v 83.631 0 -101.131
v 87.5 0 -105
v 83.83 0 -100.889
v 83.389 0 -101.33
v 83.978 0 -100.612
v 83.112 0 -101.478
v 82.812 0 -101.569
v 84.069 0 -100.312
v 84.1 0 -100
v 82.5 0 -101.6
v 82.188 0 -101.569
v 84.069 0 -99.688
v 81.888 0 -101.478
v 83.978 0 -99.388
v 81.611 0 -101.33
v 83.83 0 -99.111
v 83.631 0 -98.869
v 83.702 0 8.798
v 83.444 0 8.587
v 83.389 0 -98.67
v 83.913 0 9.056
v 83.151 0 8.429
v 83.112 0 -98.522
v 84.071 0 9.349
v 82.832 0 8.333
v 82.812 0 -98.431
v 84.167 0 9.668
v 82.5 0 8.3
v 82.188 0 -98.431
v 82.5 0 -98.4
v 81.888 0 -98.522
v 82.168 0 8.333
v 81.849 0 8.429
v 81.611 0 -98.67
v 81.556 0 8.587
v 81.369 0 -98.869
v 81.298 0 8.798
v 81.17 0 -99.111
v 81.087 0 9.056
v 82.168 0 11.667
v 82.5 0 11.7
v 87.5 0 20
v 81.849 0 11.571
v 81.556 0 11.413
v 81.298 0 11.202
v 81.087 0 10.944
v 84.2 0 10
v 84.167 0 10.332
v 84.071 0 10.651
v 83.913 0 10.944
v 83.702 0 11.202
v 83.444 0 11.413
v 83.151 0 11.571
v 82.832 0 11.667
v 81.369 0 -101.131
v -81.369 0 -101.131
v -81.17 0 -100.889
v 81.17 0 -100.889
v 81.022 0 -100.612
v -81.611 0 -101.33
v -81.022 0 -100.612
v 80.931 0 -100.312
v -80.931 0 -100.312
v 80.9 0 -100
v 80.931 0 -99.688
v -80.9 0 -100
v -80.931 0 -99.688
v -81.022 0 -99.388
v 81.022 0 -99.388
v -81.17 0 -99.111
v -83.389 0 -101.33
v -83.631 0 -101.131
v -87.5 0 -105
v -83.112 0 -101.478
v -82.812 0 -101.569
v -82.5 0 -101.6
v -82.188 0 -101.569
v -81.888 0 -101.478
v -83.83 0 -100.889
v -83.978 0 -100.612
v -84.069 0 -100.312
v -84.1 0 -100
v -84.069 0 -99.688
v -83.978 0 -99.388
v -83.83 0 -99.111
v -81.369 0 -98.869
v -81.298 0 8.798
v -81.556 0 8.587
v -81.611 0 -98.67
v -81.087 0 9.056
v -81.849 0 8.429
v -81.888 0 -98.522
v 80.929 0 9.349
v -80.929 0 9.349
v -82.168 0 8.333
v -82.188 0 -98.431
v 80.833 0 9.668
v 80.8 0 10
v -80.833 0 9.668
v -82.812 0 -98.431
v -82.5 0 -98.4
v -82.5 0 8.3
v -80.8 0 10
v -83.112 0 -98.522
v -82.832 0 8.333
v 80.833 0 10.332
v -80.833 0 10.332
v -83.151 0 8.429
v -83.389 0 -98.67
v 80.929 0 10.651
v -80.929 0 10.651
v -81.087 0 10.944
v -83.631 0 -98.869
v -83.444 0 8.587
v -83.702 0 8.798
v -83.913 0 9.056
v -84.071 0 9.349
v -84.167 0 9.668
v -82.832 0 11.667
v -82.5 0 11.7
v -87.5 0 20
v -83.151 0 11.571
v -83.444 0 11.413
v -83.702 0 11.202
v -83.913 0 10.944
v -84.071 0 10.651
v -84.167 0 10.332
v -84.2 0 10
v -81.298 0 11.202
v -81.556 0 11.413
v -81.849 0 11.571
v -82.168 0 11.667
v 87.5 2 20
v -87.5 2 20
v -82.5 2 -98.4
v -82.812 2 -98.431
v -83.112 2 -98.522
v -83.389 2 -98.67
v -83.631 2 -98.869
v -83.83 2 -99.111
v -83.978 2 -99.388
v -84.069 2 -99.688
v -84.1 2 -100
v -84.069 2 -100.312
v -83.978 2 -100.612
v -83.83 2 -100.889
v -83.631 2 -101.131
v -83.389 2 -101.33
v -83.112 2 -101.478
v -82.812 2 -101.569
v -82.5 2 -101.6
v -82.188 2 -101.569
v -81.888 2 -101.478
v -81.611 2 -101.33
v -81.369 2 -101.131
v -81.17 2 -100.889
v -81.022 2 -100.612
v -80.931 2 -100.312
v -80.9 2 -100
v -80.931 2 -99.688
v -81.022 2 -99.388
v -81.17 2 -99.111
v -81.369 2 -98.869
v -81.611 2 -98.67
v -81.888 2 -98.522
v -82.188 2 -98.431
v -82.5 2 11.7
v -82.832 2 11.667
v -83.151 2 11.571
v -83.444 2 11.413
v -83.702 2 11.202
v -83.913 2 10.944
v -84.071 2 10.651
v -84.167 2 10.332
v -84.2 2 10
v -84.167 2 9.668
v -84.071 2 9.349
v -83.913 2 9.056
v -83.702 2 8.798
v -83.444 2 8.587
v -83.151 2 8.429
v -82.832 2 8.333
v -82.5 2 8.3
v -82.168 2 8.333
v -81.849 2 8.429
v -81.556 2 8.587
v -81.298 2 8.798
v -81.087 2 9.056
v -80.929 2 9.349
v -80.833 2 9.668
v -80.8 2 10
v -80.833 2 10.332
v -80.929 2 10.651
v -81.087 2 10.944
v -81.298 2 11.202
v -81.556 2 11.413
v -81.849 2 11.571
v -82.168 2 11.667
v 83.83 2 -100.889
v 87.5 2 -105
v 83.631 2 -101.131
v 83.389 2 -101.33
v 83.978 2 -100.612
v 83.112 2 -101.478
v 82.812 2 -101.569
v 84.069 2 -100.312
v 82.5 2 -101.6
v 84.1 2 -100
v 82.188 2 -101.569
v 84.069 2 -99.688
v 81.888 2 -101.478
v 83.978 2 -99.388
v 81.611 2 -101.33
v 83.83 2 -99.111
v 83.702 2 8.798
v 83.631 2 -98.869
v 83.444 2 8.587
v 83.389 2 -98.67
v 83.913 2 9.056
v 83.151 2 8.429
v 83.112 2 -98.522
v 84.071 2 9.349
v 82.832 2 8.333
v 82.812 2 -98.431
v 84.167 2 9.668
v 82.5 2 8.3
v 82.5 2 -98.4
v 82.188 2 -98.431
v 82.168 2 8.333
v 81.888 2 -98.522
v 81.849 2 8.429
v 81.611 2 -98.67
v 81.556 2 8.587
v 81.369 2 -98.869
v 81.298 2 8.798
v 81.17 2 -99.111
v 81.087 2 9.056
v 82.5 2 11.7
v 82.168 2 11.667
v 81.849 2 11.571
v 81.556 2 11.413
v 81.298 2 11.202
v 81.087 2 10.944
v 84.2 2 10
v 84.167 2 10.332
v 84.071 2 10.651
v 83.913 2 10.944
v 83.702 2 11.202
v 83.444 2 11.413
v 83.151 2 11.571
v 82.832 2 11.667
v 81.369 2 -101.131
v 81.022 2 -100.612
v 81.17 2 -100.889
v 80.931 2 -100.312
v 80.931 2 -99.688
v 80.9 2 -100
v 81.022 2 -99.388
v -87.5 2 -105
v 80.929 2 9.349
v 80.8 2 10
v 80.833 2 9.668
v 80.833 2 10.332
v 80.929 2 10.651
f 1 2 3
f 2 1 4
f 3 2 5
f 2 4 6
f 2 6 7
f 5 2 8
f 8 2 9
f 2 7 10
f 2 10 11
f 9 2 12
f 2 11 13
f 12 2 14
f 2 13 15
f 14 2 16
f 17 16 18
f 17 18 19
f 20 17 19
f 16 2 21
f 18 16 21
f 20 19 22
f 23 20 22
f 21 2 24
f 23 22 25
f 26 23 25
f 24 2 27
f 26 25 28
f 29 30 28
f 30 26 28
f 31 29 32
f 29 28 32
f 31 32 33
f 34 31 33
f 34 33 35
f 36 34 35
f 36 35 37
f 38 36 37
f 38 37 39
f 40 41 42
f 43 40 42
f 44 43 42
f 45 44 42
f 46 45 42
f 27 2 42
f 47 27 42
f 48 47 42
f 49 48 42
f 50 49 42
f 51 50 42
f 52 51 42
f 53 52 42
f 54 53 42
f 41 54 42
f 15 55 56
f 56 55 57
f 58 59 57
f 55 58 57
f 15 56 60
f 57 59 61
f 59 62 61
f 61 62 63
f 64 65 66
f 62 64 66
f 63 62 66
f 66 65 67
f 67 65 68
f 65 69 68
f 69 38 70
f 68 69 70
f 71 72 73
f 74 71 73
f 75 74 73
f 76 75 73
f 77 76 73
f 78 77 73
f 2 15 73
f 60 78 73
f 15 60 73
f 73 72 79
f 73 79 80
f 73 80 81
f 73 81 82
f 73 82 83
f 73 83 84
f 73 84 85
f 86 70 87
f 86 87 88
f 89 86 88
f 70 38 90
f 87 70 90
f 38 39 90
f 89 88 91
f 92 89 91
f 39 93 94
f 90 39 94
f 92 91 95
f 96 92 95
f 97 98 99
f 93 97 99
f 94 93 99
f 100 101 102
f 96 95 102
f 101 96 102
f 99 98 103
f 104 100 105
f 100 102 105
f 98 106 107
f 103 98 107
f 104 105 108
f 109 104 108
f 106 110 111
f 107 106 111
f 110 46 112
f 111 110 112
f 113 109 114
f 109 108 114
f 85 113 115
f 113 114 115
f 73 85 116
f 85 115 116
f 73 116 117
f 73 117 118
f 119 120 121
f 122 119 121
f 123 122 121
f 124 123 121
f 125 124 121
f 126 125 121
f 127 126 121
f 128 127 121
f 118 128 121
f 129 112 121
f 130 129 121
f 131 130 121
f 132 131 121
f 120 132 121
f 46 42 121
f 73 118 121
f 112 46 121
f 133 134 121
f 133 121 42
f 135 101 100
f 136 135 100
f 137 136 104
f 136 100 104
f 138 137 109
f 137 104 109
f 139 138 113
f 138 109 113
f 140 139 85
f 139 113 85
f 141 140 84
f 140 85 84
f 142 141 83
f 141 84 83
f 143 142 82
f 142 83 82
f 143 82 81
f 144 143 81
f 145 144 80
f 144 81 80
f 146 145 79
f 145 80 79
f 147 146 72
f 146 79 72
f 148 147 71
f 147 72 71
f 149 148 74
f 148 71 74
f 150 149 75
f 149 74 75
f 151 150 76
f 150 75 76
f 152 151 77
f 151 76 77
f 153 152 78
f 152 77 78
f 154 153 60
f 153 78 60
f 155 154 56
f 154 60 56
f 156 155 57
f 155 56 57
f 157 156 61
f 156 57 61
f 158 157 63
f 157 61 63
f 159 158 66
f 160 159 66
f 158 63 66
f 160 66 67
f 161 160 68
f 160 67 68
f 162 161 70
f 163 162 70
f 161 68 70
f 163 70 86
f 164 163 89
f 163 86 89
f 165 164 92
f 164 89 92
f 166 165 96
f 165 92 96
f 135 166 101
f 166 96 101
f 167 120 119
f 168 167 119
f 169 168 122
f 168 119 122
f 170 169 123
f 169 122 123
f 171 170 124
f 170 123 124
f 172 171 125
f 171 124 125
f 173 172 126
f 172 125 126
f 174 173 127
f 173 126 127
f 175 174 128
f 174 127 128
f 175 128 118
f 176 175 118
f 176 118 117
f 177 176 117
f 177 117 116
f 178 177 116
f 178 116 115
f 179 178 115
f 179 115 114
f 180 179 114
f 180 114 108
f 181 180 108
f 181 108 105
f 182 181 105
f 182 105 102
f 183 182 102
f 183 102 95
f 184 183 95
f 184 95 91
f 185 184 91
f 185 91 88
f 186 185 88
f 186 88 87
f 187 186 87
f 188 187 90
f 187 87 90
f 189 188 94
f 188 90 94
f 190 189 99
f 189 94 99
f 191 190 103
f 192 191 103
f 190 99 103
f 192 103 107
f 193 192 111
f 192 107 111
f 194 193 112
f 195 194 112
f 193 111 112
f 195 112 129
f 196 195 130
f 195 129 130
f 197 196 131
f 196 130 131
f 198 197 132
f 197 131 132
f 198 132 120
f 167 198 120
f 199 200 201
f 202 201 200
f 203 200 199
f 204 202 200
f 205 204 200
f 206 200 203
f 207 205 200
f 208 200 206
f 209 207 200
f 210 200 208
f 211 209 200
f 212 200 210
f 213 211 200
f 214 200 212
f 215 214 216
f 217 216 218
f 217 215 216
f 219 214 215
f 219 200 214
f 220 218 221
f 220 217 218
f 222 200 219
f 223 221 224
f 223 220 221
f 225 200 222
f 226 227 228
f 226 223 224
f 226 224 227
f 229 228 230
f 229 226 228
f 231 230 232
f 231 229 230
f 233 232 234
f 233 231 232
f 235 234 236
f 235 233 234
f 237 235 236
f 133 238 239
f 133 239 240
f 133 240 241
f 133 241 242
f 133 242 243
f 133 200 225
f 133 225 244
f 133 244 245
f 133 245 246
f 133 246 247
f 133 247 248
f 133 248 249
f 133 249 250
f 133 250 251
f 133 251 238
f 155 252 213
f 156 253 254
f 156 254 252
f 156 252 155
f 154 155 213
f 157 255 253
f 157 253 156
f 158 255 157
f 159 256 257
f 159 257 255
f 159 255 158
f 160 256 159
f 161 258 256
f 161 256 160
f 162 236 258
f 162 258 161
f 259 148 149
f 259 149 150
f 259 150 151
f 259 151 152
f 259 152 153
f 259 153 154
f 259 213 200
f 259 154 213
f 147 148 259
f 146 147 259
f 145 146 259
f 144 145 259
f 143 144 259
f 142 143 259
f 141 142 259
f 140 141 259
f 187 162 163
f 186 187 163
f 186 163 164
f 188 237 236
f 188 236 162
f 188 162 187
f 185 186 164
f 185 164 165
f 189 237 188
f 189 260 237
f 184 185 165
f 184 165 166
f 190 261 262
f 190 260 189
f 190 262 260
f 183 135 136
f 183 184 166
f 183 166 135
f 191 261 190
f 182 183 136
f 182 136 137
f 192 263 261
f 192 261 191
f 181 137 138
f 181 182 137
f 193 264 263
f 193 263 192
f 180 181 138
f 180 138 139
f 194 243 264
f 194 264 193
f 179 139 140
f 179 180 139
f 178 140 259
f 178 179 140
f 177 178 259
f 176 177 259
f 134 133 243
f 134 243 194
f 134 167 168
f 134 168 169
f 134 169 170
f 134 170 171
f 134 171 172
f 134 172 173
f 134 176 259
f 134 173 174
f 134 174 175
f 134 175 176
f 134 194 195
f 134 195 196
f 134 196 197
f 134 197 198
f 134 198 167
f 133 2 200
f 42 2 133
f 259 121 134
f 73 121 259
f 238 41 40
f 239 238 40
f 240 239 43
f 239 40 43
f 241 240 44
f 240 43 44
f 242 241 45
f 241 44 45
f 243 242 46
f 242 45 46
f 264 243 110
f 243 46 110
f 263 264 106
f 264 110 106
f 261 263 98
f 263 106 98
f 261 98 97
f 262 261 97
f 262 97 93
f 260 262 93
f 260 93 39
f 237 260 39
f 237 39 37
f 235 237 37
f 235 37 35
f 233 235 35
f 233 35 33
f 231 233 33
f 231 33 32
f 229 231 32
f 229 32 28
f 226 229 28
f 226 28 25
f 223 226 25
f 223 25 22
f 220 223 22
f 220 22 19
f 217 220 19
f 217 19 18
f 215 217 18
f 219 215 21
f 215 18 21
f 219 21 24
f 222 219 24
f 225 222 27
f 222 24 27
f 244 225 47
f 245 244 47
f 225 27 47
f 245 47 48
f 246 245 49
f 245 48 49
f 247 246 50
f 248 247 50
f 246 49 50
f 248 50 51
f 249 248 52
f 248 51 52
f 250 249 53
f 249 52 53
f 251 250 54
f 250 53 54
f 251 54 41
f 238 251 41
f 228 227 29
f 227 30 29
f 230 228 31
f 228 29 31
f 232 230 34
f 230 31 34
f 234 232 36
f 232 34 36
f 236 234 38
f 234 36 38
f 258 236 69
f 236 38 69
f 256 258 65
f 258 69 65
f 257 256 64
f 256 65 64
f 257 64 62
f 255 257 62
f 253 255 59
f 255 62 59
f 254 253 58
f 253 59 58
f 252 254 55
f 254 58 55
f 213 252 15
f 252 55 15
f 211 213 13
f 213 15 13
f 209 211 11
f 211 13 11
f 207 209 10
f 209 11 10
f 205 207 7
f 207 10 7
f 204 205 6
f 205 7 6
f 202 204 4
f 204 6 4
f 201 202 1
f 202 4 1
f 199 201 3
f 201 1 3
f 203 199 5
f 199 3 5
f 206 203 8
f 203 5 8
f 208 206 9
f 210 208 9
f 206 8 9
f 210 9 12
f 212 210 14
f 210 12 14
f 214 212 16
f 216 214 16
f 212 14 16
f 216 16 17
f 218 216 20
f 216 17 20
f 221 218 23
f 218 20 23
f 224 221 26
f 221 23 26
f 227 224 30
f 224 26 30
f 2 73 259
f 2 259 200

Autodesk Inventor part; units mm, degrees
ref_plane "YZ Plane" through (0, 0, 0) normal (1, 0, 0) x (0, 1, 0)
ref_plane "XZ Plane" through (0, 0, 0) normal (0, 1, 0) x (-1, 0, 0)
ref_plane "XY Plane" through (0, 0, 0) normal (0, 0, 1) x (1, 0, 0)
sketch "スケッチ1" plane through (0, 0, 0) normal (0, 1, 0) x (-1, 0, 0)
  line L0 (-87.5, 105) -> (87.5, 105)
  line L1 (87.5, 105) -> (87.5, -105)
  line L2 (87.5, -105) -> (-87.5, -105)
  line L3 (-87.5, -105) -> (-87.5, 105)
  line L4 (-87.5, 105) -> (87.5, -105) construction
  line L5 (87.5, 105) -> (-87.5, -105) construction
  point P0 (0, 0)
  dimension "d0" = 210
  dimension "d1" = 175
extrude "プレート1" add sketch "スケッチ1" along normal blind 2
sketch "スケッチ5" plane through (0, 2, 0) normal (0, 1, 0) x (1, 0, 0)
  line L0 (-24, -101) -> (34.6, -101)
  line L1 (34.6, -101) -> (34.6, -67)
  line L2 (34.6, -67) -> (-24, -67)
  line L3 (-24, -67) -> (-24, -101)
  line L4 (-24, -101) -> (34.6, -67) construction
  line L5 (34.6, -101) -> (-24, -67) construction
  line L6 (87.5, -105) -> (-87.5, -105) projected
  point P0 (0, 0)
  point P1 (0, -84)
  point P2 (5.3, -84)
  point P3 (5.3, -84)
  dimension "d31" = 58.6
  dimension "d32" = 24
  dimension "d33" = 34
  dimension "d78" = 4
hole "穴3" at (34.6, 2, 67) at (34.6, 2, 101) at (-24, 2, 67) at (-24, 2, 101) direction (0, -1, 0) diameter 4.3 end through all clearance for "Socket Head Cap Screw" size "M4" standard "Ansi Metric M Profile"
sketch "スケッチ6" plane through (0, 2, 0) normal (0, 1, 0) x (1, 0, 0)
  line L0 (-133.9967, -217.2896) -> (133.2896, 49.9967)
  line L1 (133.2896, 49.9967) -> (133.9967, 49.2896)
  line L2 (133.9967, 49.2896) -> (-133.2896, -217.9967)
  line L3 (-133.2896, -217.9967) -> (-133.9967, -217.2896)
  line L4 (-133.9967, -217.2896) -> (133.9967, 49.2896) construction
  line L5 (133.2896, 49.9967) -> (-133.2896, -217.9967) construction
  line L6 (133.9967, -217.2896) -> (-133.2896, 49.9967)
  line L7 (-133.2896, 49.9967) -> (-133.9967, 49.2896)
  line L8 (-133.9967, 49.2896) -> (133.2896, -217.9967)
  line L9 (133.2896, -217.9967) -> (133.9967, -217.2896)
  line L10 (133.9967, -217.2896) -> (-133.9967, 49.2896) construction
  line L11 (-133.2896, 49.9967) -> (133.2896, -217.9967) construction
  line L12 (-2.4749, -82.2322) -> (-1.7678, -81.5251)
  circle A0 centre (0, -84) radius 22
  line L13 (2.4749, -82.2322) -> (1.7678, -81.5251)
  circle A1 centre (0, -84) radius 3
  line L14 (-87.5, -105) -> (-87.5, 105) projected
  line L15 (87.5, 105) -> (87.5, -105) projected
  line L16 (122.5, 0) -> (-122.5, 0) projected
  point P0 (0, 0)
  point P1 (0, -84)
  point P2 (-2.1213, -81.8787)
  point P3 (2.1213, -81.8787)
  point P4 (15.9059, -68.8012)
  point P5 (-15.9059, -68.8012)
  dimension "d54" = 1
  dimension "d55" = 1
  dimension "d57" = 44
  dimension "d59" = 3
  dimension "d60" = 3
  dimension "d65" = 186
  dimension "d66" = 186
  dimension "d79" = 45
  dimension "d80" = 45
extrude "押し出し2" cut sketch "スケッチ6" against normal blind 10 contours A0 L6 L12 L8 | A0 L0 A1 L6 | L12 L6 A1 | A0 L2 L13 L0 | L0 L13 A1
sketch "スケッチ7" plane through (0, 2, 0) normal (0, 1, 0) x (1, 0, 0)
  line L0 (-82.5, -100) -> (82.5, -100)
  line L1 (82.5, -100) -> (82.5, 100)
  line L2 (82.5, 100) -> (-82.5, 100)
  line L3 (-82.5, 100) -> (-82.5, -100)
  line L4 (-82.5, -100) -> (82.5, 100) construction
  line L5 (82.5, -100) -> (-82.5, 100) construction
  line L6 (-87.5, -105) -> (-87.5, 105) projected
  line L7 (87.5, -105) -> (-87.5, -105) projected
  point P0 (0, 0)
  point P1 (-82.5, -45)
  point P2 (-82.5, -10)
  point P3 (82.5, -45)
  point P4 (82.5, -10)
  dimension "d45" = 5
  dimension "d46" = 5
  dimension "d67" = 55
  dimension "d68" = 35
  dimension "d69" = 55
  dimension "d70" = 35
hole "穴4" at (-82.5, 2, -100) at (82.5, 2, -100) at (-82.5, 2, 100) at (82.5, 2, 100) direction (0, -1, 0) diameter 3.2 end through all clearance for "Socket Head Cap Screw" size "M3" standard "Ansi Metric M Profile"
sketch "スケッチ8" plane through (0, 2, 0) normal (0, 1, 0) x (1, 0, 0)
  line L0 (15.9059, -68.8012) -> (2.4749, -82.2322) projected
  line L1 (-2.1213, -81.8787) -> (-2.4749, -82.2322) projected
  arc A0 (2.1213, -81.8787) -> (-2.1213, -81.8787) centre (0, -84) ccw projected
  line L2 (2.4749, -82.2322) -> (2.1213, -81.8787) projected
  line L3 (-2.4749, -82.2322) -> (-15.9059, -68.8012) projected
  arc A1 (15.9059, -68.8012) -> (-15.9059, -68.8012) centre (0, -84) ccw projected
  line L4 (2.4749, -83.6464) -> (17.2895, -68.8318)
  arc A2 (17.2895, -68.8318) -> (-17.2895, -68.8318) centre (0, -84) ccw
  line L5 (-17.2895, -68.8318) -> (-2.4749, -83.6464)
  line L6 (-2.4749, -83.6464) -> (-1.4142, -82.5858)
  arc A3 (1.4142, -82.5858) -> (-1.4142, -82.5858) centre (0, -84) ccw
  line L7 (1.4142, -82.5858) -> (2.4749, -83.6464)
  point P0 (0, 0)
  dimension "d61" = 1
extrude "押し出し3" cut sketch "スケッチ8" against normal blind 10 contours L0 L2 A0 L1 L3 A1 | L7 A3 L6 L5 A2 L4
fillet "コーナーR1" radius 1 4 edges at (-2.4749, 1, 83.6464) (2.4749, 1, 83.6464) (-17.2895, 1, 68.8318) (17.2895, 1, 68.8318)
hole "穴5" at (-82.5, 2, 45) at (-82.5, 2, 10) at (82.5, 2, 45) at (82.5, 2, 10) direction (0, -1, 0) diameter 3.4 end through all clearance for "Flat Head Machine Screw" size "M3" standard "Ansi Metric M Profile"
ref_plane "作業平面1" through (-87.5, 0, 20) normal (0, 0, 1) x (1, 0, 0)
sketch "スケッチ9" plane through (-87.5, 0, 20) normal (0, 0, 1) x (1, 0, 0)
  line L0 (175, 0) -> (175, 2) projected
  line L1 (0, 0) -> (175, 0)
  line L2 (175, 0) -> (175, 2)
  line L3 (175, 2) -> (0, 2)
  line L4 (0, 2) -> (0, 0)
  point P0 (87.5, 0)
extrude "押し出し4" cut sketch "スケッチ9" along normal blind 159
equation "\"d40\" = Thickness"
equation "\"d60\" = d59"
equation "\"d66\" = d65"
equation "\"d69\" = d67"
equation "\"d70\" = d68"
equation "\"d76\" = Thickness"
equation "\"d2\" = Thickness"
equation "\"BendRadius\" = Thickness"
equation "\"BendReliefWidth\" = Thickness"
equation "\"BendReliefDepth\" = 0.5 * Thickness"
equation "\"CornerReliefSize\" = 4 * Thickness"
equation "\"MinimumRemnant\" = 2 * Thickness"
equation "\"TransitionRadius\" = BendRadius"
equation "\"JacobiRadiusSize\" = BendRadius"
equation "\"GapSize\" = Thickness"
equation "\"Thickness\" = 2"
properties part number "s_carbon_plate1" material "CFRP"
